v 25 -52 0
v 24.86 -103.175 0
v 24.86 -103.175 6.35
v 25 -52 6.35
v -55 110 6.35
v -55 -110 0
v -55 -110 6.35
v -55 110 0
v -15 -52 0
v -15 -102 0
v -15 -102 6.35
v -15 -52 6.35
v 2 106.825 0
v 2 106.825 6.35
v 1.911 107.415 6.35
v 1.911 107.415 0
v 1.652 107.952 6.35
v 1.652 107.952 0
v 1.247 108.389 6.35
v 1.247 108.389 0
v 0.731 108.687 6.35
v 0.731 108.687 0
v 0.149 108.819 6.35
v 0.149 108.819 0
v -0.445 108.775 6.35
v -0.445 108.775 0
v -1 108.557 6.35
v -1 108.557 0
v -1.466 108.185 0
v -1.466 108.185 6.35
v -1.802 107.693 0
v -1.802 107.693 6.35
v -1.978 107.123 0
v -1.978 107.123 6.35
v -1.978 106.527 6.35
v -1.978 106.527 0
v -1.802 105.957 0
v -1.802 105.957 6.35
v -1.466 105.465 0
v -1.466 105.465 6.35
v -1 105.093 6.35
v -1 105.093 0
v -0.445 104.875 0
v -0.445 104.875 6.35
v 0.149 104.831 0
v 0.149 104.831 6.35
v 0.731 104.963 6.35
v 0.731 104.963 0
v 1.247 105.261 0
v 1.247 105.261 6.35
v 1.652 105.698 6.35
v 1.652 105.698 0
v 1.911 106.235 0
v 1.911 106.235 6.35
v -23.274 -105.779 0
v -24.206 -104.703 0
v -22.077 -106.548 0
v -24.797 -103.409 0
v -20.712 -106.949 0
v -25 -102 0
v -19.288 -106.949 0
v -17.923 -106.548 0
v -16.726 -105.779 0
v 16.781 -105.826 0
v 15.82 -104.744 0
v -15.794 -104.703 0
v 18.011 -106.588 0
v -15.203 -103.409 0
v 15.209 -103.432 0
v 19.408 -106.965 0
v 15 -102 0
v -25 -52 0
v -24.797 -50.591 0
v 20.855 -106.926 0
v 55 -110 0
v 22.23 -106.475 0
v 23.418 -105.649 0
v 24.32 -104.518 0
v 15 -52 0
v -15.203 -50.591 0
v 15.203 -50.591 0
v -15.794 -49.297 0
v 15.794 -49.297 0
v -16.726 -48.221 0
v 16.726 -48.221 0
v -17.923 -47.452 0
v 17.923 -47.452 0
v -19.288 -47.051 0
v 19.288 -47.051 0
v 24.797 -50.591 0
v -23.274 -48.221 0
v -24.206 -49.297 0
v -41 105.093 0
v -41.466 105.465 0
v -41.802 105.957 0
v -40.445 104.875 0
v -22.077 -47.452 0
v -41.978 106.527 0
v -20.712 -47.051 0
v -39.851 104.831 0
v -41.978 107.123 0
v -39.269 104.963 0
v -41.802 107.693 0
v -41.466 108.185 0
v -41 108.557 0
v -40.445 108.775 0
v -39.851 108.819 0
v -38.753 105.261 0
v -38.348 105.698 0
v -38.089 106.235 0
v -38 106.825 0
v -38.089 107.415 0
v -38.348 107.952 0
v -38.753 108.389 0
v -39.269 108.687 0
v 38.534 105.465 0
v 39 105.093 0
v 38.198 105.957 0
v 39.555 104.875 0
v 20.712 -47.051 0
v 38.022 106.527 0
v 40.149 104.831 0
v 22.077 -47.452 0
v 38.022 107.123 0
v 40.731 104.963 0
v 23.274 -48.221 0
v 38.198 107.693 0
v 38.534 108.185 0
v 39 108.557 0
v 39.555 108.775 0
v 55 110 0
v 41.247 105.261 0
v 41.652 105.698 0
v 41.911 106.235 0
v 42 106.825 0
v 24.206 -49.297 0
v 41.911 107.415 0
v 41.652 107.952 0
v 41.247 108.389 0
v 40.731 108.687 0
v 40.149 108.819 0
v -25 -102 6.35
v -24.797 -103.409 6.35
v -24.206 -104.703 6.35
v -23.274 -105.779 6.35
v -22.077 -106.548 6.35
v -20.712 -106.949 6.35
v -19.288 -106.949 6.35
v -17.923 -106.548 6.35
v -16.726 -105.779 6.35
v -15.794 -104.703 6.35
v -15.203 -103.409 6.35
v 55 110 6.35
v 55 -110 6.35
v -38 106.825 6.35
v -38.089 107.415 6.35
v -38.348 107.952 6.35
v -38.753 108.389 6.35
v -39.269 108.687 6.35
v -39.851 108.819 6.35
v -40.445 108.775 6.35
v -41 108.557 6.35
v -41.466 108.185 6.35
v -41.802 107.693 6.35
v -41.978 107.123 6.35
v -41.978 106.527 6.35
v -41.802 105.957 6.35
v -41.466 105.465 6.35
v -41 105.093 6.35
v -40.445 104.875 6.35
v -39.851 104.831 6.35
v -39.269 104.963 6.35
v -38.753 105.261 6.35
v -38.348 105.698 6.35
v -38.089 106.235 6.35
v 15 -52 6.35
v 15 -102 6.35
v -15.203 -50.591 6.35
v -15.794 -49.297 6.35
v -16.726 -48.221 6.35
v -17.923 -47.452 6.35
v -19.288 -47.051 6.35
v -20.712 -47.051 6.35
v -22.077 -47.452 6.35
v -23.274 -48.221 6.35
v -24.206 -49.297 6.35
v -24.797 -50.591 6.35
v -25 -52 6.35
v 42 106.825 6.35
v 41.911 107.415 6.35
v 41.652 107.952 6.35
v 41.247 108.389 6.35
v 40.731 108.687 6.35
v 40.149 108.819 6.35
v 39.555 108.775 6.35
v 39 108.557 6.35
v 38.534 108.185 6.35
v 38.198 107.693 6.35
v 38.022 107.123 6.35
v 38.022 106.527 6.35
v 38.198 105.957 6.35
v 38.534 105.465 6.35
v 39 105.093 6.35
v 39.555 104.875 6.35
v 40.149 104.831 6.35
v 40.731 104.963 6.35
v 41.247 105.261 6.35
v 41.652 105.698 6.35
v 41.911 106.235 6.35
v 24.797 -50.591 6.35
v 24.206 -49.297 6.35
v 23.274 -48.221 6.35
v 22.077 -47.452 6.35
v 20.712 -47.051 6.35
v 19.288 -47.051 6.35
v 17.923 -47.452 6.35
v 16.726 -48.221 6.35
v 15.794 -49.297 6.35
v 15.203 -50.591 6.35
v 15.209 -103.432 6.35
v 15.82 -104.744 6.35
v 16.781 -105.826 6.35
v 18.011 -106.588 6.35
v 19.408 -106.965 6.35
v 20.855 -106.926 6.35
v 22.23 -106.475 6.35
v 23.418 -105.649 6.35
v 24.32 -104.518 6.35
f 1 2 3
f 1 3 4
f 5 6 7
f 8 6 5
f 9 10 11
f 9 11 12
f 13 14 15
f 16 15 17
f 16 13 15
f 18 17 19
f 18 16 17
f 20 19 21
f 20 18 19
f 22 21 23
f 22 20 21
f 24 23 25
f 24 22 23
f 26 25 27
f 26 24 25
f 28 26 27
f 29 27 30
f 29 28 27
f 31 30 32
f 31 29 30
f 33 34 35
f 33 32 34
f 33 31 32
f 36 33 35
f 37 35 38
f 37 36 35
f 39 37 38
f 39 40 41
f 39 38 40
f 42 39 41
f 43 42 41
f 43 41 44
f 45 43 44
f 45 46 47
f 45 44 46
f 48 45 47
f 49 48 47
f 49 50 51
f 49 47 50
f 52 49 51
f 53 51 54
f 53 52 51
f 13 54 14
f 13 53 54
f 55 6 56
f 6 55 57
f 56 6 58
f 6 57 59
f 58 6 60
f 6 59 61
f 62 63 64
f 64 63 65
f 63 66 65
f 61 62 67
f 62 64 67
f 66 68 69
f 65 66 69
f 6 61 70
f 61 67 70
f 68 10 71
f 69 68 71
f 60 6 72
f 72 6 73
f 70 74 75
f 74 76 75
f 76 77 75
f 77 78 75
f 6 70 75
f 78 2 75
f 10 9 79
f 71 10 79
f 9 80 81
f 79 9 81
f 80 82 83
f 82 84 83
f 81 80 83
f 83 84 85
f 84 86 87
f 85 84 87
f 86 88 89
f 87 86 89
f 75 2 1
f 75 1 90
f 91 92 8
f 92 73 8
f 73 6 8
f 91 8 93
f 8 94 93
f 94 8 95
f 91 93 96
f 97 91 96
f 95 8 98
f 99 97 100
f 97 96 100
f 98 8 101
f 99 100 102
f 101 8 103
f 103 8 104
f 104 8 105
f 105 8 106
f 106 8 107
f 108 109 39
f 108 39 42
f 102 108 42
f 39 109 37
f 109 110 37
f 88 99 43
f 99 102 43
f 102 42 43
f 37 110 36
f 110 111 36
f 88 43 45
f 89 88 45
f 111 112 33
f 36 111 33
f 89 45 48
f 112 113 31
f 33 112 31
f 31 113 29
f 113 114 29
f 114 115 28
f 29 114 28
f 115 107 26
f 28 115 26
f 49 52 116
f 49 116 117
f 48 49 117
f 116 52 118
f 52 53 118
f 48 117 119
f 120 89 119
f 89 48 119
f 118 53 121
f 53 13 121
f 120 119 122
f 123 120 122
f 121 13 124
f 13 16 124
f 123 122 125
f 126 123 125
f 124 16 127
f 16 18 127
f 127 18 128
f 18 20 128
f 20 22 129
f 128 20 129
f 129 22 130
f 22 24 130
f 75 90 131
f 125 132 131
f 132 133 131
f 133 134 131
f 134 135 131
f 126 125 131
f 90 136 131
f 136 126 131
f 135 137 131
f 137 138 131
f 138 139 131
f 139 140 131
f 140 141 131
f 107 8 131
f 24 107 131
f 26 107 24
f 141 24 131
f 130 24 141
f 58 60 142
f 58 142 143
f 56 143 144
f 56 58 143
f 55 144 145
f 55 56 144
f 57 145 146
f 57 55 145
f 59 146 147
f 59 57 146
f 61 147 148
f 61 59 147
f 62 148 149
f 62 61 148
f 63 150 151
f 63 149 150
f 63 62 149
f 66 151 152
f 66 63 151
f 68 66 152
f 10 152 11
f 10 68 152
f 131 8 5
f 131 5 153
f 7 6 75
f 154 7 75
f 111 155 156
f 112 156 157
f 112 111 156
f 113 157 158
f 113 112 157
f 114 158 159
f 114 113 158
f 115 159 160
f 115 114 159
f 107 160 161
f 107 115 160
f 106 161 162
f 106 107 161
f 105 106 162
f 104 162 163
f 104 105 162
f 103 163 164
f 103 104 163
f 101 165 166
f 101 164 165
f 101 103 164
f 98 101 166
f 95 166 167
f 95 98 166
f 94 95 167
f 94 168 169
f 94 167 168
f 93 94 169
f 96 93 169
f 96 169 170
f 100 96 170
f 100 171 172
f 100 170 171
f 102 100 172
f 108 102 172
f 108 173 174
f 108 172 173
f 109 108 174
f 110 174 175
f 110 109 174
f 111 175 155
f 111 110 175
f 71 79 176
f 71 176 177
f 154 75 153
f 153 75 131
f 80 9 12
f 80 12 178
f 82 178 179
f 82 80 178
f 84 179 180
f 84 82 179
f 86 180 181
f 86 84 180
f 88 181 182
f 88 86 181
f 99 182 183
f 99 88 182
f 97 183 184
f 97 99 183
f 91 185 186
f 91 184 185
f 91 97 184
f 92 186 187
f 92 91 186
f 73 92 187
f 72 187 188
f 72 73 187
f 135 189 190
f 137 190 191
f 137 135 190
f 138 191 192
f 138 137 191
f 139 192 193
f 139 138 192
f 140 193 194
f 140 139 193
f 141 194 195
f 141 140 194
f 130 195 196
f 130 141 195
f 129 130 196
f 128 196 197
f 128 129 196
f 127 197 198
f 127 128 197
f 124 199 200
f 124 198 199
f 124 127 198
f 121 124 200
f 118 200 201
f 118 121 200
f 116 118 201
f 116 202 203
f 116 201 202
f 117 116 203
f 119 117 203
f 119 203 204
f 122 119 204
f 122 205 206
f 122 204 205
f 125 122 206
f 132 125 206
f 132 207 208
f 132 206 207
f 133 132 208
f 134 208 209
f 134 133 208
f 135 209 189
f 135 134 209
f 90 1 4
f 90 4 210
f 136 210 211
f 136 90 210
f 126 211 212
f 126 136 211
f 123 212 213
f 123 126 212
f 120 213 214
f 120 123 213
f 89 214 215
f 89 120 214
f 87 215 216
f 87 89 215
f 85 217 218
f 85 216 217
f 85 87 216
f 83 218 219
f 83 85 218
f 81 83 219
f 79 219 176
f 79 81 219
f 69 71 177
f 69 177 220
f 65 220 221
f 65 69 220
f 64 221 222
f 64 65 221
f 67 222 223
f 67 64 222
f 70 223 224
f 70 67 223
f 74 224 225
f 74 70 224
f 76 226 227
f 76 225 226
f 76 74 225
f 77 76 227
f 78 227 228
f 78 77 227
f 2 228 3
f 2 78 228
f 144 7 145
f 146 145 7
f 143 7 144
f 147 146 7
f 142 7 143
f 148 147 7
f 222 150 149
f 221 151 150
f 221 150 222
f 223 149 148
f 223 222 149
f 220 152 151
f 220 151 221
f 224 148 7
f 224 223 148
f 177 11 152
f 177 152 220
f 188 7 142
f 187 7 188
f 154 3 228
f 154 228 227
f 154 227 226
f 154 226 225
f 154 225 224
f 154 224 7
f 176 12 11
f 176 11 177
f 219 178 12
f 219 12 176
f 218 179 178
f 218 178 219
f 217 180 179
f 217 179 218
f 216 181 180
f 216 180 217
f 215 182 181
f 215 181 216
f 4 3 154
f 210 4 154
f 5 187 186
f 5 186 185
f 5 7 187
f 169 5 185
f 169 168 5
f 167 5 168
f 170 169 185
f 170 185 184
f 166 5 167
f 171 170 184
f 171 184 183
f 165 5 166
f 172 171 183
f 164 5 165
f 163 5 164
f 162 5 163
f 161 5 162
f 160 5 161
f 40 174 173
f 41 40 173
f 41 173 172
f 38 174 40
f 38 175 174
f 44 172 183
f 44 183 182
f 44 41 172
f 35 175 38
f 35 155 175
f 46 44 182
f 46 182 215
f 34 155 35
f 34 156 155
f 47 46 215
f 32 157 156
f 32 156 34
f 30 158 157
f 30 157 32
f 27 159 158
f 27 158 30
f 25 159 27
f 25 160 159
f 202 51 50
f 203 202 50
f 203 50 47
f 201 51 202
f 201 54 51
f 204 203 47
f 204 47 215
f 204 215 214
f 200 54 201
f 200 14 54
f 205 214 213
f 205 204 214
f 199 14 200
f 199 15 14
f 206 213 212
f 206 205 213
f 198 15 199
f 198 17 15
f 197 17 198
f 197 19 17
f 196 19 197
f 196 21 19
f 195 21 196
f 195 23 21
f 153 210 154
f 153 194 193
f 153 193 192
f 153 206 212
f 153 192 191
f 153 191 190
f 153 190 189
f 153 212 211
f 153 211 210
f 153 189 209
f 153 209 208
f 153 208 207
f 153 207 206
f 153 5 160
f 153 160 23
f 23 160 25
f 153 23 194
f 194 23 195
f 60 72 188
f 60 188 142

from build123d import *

# Parameters (mm, degrees)
CROQUIS1_W              = 110
CROQUIS1_H              = 220
SALIENTE_EXTRUIR1_DEPTH = 6.35
CROQUIS2_R              = 2
CORTAR_EXTRUIR2_DEPTH   = 7.35


with BuildPart() as part:
    # Croquis1 → Saliente-Extruir1 (new body)
    with BuildSketch(Plane.XY):
        Rectangle(CROQUIS1_W, CROQUIS1_H)
    extrude(amount=SALIENTE_EXTRUIR1_DEPTH)

    # Croquis2 → Cortar-Extruir2 (cut, through all)
    with BuildSketch(Plane.XY):
        with Locations((40, 106.825)):
            Circle(CROQUIS2_R)
        with Locations((-40, 106.825)):
            Circle(CROQUIS2_R)
        with Locations((0, 106.825)):
            Circle(CROQUIS2_R)
        with BuildLine():
            Line((15, -52), (15, -102))
            ThreePointArc((15, -102), (19.408343114, -106.964870807), (24.859976852, -103.175))
            Line((24.859976852, -103.175), (25, -52))
            ThreePointArc((25, -52), (20, -47), (15, -52))
        make_face()
        with BuildLine():
            Line((-25, -52), (-25, -102))
            ThreePointArc((-25, -102), (-20, -107), (-15, -102))
            Line((-15, -102), (-15, -52))
            ThreePointArc((-15, -52), (-20, -47), (-25, -52))
        make_face()
    extrude(amount=CORTAR_EXTRUIR2_DEPTH, mode=Mode.SUBTRACT)


solid = part.part
